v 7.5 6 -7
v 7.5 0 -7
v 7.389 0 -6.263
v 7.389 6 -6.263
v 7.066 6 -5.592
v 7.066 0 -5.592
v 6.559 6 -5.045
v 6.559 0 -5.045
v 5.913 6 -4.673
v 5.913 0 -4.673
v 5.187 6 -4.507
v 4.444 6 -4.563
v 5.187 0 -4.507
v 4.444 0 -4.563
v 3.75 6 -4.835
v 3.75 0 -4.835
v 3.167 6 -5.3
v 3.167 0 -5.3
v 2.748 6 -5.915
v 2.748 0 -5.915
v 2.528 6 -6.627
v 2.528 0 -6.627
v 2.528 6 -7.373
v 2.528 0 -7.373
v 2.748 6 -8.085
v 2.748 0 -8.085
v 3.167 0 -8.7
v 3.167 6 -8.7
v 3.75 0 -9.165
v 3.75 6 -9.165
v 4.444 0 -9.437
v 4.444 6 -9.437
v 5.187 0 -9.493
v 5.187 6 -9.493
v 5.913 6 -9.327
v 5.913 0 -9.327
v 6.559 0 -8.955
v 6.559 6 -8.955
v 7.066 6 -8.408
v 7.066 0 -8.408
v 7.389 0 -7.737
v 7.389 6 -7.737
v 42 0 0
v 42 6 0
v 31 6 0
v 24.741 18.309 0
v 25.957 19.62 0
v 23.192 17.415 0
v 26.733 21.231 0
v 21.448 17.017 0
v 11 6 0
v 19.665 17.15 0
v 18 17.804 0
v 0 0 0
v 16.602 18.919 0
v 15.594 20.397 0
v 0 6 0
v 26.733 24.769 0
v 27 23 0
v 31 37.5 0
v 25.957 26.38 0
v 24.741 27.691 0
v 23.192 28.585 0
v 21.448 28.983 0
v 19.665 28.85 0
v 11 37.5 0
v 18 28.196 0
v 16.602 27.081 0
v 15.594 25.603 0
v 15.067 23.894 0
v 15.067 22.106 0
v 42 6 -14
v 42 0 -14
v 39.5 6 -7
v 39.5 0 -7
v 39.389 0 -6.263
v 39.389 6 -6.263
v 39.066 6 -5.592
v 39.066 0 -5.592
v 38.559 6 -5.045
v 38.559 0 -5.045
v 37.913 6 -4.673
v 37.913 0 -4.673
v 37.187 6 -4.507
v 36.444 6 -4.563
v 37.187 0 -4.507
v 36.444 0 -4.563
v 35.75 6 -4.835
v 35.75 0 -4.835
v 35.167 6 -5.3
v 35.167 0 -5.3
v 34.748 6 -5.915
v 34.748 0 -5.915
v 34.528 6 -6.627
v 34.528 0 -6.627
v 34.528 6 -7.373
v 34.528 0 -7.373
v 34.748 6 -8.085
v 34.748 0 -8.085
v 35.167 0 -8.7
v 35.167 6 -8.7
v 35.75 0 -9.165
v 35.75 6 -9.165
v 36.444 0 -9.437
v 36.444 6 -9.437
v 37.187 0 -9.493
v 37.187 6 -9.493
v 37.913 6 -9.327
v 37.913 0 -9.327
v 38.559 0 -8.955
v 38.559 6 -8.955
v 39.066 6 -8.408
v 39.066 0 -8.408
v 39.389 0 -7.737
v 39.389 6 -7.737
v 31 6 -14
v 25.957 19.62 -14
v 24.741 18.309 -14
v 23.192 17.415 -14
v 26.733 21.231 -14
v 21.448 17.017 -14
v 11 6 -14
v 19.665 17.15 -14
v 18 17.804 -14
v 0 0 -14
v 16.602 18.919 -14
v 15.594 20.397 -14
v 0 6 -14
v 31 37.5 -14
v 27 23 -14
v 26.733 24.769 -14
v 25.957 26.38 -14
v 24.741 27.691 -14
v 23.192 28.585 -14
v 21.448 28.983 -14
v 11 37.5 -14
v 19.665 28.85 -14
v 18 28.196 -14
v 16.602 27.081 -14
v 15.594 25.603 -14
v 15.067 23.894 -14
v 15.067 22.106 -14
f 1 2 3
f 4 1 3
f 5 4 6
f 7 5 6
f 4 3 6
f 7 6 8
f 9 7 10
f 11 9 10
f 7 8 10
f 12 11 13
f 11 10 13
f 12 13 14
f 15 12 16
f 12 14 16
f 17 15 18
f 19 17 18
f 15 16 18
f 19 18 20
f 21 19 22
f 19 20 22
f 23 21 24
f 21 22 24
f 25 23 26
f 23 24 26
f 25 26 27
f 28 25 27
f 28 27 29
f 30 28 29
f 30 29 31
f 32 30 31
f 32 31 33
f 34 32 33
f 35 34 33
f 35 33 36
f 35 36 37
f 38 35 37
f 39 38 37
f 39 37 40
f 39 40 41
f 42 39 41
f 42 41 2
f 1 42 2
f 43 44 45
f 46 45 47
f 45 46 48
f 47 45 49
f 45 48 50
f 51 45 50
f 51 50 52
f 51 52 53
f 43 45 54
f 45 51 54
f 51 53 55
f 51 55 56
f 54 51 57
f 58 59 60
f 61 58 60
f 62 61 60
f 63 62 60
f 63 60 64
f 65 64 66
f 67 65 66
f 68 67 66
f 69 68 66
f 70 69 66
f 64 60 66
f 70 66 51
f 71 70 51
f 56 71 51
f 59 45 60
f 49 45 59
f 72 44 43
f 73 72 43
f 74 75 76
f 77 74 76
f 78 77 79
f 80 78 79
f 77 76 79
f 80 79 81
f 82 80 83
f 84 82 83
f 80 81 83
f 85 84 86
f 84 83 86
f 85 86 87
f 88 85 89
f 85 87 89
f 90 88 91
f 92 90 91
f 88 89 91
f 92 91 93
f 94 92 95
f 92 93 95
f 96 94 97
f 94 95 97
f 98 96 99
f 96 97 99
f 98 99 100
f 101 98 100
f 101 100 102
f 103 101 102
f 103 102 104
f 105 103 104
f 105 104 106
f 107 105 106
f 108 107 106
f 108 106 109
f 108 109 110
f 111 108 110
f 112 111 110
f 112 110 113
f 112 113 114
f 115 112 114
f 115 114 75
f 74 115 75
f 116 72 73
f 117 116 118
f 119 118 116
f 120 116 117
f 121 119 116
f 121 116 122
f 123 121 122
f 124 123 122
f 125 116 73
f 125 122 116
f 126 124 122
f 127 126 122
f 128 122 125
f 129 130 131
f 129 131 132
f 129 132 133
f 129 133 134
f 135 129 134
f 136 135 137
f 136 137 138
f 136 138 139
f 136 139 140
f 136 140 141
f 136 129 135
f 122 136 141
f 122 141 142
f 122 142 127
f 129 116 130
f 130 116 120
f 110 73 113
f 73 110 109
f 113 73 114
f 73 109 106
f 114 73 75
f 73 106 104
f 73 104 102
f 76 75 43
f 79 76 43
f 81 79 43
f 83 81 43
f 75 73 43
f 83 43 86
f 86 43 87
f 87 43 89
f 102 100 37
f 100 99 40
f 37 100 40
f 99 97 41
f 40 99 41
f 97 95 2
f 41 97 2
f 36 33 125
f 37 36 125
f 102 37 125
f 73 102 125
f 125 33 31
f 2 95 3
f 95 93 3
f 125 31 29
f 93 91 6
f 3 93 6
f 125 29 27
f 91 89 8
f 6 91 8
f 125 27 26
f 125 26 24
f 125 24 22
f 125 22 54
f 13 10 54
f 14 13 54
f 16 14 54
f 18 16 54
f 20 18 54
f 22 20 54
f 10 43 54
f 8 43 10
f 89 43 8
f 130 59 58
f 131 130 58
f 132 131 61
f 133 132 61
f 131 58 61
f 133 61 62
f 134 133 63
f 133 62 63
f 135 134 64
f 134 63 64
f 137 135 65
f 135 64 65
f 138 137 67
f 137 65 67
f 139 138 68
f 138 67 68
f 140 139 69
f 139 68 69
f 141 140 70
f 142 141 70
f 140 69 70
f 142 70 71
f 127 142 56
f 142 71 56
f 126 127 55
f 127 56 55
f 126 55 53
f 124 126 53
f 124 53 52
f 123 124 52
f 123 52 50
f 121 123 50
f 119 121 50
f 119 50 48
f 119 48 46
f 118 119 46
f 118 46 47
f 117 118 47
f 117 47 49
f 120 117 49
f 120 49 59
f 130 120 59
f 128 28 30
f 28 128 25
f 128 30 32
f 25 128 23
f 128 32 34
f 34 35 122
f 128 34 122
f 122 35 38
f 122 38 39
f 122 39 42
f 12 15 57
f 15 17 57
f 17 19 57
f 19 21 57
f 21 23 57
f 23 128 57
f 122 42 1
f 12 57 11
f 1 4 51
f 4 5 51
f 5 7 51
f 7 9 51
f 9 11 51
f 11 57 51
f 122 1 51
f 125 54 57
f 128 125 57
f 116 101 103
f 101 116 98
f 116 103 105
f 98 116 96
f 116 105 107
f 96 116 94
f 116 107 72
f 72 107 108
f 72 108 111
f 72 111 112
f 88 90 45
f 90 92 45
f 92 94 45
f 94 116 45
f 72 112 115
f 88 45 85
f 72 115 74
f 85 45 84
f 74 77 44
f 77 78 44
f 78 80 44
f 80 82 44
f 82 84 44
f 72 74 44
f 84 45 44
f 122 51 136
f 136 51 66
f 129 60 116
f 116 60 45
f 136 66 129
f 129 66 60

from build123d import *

# Parameters (mm, degrees)
BOSS_EXTRUDE1_DEPTH = 14
CUT_EXTRUDE1_REACH  = 39.5
SKETCH2_R           = 2.5
CUT_EXTRUDE2_REACH  = 16
SKETCH3_R           = 6


with BuildPart() as part:
    # Sketch1 → Boss-Extrude1 (new body)
    with BuildSketch(Plane.XY):
        Polygon((0, 0), (0, 6), (11, 6), (11, 37.5), (31, 37.5), (31, 6), (42, 6), (42, 0), align=None)
    extrude(amount=-BOSS_EXTRUDE1_DEPTH)

    # Sketch2 → Cut-Extrude1 (cut, up to next)
    with BuildSketch(Plane.XZ, mode=Mode.PRIVATE) as cut_extrude1_sk1:
        with Locations((5, -7)):
            Circle(SKETCH2_R)
    cut_extrude1_tool1 = extrude(cut_extrude1_sk1.sketch, amount=-CUT_EXTRUDE1_REACH, mode=Mode.PRIVATE) & part.part
    add(cut_extrude1_tool1.solids().sort_by_distance((5, 0, -7))[0], mode=Mode.SUBTRACT)
    # Sketch2 → Cut-Extrude1 (cut, up to next)
    with BuildSketch(Plane.XZ, mode=Mode.PRIVATE) as cut_extrude1_sk2:
        with Locations((37, -7)):
            Circle(SKETCH2_R)
    cut_extrude1_tool2 = extrude(cut_extrude1_sk2.sketch, amount=-CUT_EXTRUDE1_REACH, mode=Mode.PRIVATE) & part.part
    add(cut_extrude1_tool2.solids().sort_by_distance((37, 0, -7))[0], mode=Mode.SUBTRACT)

    # Sketch3 → Cut-Extrude2 (cut, up to next)
    with BuildSketch(Plane.XY, mode=Mode.PRIVATE) as cut_extrude2_sk1:
        with Locations((21, 23)):
            Circle(SKETCH3_R)
    cut_extrude2_tool1 = extrude(cut_extrude2_sk1.sketch, amount=-CUT_EXTRUDE2_REACH, mode=Mode.PRIVATE) & part.part
    add(cut_extrude2_tool1.solids().sort_by_distance((21, 23, 0))[0], mode=Mode.SUBTRACT)


solid = part.part
